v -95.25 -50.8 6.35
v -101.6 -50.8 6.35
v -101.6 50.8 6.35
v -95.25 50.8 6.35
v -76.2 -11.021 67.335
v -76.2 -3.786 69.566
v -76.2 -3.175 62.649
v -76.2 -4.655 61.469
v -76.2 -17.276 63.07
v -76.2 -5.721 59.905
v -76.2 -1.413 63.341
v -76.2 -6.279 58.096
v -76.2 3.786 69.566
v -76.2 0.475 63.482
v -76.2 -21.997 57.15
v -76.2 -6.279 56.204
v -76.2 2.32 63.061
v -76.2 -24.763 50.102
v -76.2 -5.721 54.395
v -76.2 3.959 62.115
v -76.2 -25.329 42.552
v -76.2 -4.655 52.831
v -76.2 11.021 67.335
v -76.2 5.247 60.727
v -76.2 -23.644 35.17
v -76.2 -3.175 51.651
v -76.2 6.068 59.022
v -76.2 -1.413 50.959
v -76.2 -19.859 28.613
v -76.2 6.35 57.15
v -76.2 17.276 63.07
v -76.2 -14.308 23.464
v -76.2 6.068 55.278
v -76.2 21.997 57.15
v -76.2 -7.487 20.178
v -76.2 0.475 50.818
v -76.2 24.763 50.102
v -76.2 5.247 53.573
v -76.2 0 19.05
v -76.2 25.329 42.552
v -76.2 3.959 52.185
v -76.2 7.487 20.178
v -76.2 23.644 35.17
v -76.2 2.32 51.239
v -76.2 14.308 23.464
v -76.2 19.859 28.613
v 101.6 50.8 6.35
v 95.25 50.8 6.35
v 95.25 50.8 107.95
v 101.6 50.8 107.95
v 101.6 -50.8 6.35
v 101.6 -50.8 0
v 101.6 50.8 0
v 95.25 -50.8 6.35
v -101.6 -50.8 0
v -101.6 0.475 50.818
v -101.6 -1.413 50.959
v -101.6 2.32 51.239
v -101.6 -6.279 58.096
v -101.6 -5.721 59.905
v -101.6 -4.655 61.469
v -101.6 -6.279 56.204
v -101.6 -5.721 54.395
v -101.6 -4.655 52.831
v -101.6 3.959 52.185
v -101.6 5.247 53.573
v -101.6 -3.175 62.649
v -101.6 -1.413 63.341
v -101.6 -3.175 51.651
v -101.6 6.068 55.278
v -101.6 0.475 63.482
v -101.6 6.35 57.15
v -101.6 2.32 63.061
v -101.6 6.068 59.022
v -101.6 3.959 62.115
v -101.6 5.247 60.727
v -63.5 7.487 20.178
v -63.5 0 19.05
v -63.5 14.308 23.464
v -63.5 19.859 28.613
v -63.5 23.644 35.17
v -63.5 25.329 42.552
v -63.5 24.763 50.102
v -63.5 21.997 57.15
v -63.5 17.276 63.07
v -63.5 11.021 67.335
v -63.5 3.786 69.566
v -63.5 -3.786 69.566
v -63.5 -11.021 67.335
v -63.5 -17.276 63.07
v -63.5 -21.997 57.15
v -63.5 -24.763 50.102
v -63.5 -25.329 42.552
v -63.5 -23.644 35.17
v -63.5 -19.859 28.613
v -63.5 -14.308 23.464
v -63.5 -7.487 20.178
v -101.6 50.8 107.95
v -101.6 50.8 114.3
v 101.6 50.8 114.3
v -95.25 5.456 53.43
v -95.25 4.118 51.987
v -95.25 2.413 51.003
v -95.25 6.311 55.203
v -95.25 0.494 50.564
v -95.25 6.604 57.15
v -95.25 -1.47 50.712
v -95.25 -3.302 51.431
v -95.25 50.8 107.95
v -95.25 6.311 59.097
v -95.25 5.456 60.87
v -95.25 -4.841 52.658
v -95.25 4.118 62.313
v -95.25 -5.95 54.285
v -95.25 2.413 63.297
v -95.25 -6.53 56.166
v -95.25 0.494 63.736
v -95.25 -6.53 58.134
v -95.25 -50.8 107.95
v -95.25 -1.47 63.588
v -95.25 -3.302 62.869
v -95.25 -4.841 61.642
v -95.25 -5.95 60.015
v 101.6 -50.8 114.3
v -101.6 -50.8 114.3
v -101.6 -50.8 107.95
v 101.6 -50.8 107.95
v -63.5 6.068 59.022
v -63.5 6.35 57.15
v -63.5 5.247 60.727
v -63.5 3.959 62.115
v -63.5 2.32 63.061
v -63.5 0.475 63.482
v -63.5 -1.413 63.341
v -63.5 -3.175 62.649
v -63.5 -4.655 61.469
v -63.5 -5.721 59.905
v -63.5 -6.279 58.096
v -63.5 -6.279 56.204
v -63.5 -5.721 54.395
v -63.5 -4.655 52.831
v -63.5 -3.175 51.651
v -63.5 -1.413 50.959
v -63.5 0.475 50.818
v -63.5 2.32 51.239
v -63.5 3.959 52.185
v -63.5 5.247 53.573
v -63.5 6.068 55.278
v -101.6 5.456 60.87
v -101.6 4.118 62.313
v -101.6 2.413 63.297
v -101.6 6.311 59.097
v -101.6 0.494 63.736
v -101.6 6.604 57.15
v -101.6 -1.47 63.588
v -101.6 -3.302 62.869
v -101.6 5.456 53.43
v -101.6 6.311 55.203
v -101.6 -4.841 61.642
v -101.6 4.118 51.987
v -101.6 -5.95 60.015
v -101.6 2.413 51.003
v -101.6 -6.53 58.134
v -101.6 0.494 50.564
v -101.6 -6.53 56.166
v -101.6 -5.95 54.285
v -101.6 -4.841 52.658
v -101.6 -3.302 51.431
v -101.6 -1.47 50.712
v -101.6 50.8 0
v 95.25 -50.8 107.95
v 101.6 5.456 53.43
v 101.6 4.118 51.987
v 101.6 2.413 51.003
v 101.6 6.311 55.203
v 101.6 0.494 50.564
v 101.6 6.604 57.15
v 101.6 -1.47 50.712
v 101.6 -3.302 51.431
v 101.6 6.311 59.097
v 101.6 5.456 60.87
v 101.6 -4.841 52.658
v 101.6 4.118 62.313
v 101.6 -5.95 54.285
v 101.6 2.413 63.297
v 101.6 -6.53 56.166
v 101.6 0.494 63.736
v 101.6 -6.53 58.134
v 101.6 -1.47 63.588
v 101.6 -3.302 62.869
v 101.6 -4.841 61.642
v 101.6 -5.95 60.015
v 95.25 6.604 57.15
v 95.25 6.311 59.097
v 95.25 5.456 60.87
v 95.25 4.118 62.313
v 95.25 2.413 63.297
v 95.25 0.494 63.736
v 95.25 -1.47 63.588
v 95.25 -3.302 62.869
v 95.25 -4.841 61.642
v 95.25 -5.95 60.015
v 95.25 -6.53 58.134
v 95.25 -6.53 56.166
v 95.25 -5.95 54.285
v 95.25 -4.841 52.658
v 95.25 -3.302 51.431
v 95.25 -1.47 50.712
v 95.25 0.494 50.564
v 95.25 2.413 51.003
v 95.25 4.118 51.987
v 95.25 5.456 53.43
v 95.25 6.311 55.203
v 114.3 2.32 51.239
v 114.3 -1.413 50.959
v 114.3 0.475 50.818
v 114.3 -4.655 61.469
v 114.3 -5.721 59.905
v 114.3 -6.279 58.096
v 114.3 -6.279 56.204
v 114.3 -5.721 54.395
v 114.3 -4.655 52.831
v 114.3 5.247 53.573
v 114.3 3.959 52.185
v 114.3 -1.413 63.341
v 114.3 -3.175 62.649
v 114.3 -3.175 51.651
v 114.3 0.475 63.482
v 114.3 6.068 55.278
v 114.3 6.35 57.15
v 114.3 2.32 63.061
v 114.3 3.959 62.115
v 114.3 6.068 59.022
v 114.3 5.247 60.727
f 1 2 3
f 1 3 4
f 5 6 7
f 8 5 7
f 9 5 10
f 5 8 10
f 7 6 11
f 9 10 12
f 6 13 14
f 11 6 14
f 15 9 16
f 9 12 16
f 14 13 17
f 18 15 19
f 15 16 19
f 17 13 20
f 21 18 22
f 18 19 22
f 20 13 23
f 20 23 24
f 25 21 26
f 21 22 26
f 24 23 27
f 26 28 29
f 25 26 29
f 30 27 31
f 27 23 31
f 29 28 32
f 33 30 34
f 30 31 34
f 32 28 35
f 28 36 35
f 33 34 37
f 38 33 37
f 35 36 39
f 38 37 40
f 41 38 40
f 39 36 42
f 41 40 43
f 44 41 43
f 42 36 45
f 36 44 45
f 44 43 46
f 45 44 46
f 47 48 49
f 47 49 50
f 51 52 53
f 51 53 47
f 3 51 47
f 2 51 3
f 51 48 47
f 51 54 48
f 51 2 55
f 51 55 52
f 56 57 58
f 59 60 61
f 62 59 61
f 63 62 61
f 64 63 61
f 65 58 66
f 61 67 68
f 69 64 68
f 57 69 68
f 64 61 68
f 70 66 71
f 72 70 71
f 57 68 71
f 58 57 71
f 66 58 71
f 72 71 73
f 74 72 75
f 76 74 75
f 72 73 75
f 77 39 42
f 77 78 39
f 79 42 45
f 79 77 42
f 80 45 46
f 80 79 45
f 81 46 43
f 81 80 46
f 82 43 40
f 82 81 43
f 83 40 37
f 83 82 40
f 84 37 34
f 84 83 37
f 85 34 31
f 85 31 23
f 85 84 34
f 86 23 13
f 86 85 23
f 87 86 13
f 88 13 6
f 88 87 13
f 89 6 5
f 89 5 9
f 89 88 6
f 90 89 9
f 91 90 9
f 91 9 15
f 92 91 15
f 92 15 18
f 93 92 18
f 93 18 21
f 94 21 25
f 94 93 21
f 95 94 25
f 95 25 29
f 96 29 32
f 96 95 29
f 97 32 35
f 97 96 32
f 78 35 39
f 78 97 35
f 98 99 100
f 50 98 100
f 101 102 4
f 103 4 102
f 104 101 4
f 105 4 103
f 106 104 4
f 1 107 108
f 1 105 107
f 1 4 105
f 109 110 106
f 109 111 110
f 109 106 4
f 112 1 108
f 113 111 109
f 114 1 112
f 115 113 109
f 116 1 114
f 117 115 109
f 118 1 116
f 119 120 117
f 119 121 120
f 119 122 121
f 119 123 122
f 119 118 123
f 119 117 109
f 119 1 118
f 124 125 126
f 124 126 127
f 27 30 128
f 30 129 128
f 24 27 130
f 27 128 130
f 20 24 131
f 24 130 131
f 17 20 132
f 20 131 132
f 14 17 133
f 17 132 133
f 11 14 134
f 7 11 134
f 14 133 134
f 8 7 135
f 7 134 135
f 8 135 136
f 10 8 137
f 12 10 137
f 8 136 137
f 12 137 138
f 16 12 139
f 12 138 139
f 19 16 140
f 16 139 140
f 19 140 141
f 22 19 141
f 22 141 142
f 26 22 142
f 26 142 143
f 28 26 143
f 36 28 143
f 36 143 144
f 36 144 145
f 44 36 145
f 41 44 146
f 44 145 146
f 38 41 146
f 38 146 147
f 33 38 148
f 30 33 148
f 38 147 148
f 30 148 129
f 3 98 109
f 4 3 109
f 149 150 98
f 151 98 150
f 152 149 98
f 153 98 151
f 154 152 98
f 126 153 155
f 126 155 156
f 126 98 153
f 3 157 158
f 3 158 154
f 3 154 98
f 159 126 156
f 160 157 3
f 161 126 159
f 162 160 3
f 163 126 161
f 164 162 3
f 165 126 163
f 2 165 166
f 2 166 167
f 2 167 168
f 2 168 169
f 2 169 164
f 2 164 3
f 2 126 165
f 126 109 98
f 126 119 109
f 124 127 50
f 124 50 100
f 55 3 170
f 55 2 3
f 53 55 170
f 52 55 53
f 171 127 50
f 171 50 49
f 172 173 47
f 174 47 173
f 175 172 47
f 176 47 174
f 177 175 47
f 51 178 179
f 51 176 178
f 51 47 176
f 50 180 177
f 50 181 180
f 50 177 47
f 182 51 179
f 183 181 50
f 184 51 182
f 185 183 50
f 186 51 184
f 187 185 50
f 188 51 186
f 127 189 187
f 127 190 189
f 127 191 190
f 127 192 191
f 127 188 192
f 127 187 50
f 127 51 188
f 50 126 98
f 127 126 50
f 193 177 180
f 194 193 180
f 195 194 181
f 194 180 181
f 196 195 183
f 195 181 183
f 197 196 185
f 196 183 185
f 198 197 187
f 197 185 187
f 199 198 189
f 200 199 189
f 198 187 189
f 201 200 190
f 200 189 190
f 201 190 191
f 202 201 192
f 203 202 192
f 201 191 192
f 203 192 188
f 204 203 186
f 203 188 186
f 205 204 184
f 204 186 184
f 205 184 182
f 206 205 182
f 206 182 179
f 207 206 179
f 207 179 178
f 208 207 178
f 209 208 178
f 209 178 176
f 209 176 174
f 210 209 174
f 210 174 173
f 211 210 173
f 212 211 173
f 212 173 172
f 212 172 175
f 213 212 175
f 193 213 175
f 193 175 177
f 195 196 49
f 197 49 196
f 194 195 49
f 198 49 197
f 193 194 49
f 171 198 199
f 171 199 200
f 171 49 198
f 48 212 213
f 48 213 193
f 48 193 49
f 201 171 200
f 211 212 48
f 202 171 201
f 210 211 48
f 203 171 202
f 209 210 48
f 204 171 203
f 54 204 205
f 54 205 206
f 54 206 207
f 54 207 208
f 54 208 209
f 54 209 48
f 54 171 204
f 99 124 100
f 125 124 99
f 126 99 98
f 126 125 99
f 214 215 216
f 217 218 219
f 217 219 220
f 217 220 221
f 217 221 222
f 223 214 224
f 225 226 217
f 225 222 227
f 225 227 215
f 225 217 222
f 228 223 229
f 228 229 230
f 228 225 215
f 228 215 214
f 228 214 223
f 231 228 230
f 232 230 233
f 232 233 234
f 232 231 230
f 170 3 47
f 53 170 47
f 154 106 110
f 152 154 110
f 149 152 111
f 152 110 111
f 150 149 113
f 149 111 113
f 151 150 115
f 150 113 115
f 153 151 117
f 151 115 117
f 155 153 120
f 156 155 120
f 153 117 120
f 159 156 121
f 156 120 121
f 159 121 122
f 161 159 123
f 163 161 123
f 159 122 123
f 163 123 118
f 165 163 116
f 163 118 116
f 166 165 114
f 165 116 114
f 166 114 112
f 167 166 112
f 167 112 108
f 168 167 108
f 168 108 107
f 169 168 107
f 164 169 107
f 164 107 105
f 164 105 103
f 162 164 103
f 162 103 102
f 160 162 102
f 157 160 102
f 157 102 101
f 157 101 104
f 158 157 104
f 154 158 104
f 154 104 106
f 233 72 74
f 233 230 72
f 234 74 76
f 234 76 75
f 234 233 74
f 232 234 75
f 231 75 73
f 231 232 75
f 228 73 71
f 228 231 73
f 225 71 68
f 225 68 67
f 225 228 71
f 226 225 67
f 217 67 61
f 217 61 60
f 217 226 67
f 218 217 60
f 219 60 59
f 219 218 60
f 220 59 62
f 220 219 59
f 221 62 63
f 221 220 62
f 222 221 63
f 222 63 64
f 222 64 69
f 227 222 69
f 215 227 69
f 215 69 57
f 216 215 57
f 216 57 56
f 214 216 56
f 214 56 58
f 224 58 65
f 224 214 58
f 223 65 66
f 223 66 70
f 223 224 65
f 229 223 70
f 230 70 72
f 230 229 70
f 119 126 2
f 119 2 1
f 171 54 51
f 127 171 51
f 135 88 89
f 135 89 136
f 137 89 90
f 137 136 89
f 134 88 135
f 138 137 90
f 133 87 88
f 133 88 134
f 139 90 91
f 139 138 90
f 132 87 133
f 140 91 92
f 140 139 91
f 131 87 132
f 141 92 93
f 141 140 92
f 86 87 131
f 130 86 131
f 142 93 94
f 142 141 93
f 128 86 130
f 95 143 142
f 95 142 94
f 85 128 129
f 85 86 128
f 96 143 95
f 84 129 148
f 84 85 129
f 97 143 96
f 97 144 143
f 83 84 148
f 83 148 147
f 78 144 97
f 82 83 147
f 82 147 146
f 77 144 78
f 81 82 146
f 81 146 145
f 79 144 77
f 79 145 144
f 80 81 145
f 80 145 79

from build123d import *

# Parameters (mm, degrees)
F1_DEPTH      = 50.8
F2_DEPTH      = 50.8
F2_DEPTH_BACK = 50.8
F3_R          = 6.604
F3_R_2        = 6.35
F4_DEPTH      = 203.201
F5_DEPTH      = 12.7
F5_DEPTH_BACK = 203.2
F0_W          = 12.7
F0_H          = 25.4


with BuildPart() as f1:
    # F0 (on Front) → F1 (new body, symmetric)
    with BuildSketch(Plane.XZ):
        Polygon((-95.25, 6.35), (-101.6, 6.35), (-101.6, 0), (101.6, 0), (101.6, 6.35), (95.25, 6.35), align=None)
    extrude(amount=F1_DEPTH, both=True)


with BuildPart() as f1b:
    # F0 (on Front) → F1, piece 2 (new body, symmetric)
    with BuildSketch(Plane.XZ):
        Polygon((-101.6, 114.3), (-101.6, 107.95), (-95.25, 107.95), (95.25, 107.95), (101.6, 107.95), (101.6, 114.3), align=None)
    extrude(amount=F1_DEPTH, both=True)


with BuildPart() as f2:
    # F0 (on Front) → F2 (new body, two sides)
    with BuildSketch(Plane.XZ) as f2_sk:
        Polygon((-101.6, 107.95), (-101.6, 6.35), (-95.25, 6.35), (-95.25, 57.15), (-95.25, 107.95), align=None)
    extrude(amount=F2_DEPTH)
    extrude(f2_sk.sketch, amount=-F2_DEPTH_BACK)


with BuildPart() as f2b:
    # F0 (on Front) → F2, piece 2 (new body, two sides)
    with BuildSketch(Plane.XZ) as f2_2_sk:
        Polygon((95.25, 57.15), (95.25, 6.35), (101.6, 6.35), (101.6, 107.95), (95.25, 107.95), align=None)
    extrude(amount=F2_DEPTH)
    extrude(f2_2_sk.sketch, amount=-F2_DEPTH_BACK)


with BuildPart() as f4_tool:
    # F3 (on face) → F4 (new body, through all)
    with BuildSketch(Plane.YZ.offset(101.6)):
        with Locations((0, 57.15)):
            Circle(F3_R)
        with Locations((0, 57.15)):
            Circle(F3_R_2, mode=Mode.SUBTRACT)
        with Locations((0, 57.15)):
            Circle(F3_R_2)
    extrude(amount=-F4_DEPTH)


with BuildPart() as f2_1:
    add(f2.part)

    # F4: cut by f4_tool
    add(f4_tool.part, mode=Mode.SUBTRACT)


with BuildPart() as f2b_1:
    add(f2b.part)

    # F4: cut by f4_tool
    add(f4_tool.part, mode=Mode.SUBTRACT)


with BuildPart() as f5:
    # F3 (on face) → F5 (new body, two sides)
    with BuildSketch(Plane.YZ.offset(101.6)) as f5_sk:
        with Locations((0, 57.15)):
            Circle(F3_R_2)
    extrude(amount=F5_DEPTH)
    extrude(f5_sk.sketch, amount=-F5_DEPTH_BACK)


with BuildPart() as f6:
    # F0 (on Front) → F6 (revolve)
    with BuildSketch(Plane.XZ):
        with Locations((-69.85, 31.75)):
            Rectangle(F0_W, F0_H)
    revolve(axis=Axis((-69.85, 0, 44.45), (1, 0, 0)))

    # F7: cut F5
    add(f5.part, mode=Mode.SUBTRACT)


solid = Compound([f1.part, f1b.part, f2_1.part, f2b_1.part, f5.part, f6.part])
